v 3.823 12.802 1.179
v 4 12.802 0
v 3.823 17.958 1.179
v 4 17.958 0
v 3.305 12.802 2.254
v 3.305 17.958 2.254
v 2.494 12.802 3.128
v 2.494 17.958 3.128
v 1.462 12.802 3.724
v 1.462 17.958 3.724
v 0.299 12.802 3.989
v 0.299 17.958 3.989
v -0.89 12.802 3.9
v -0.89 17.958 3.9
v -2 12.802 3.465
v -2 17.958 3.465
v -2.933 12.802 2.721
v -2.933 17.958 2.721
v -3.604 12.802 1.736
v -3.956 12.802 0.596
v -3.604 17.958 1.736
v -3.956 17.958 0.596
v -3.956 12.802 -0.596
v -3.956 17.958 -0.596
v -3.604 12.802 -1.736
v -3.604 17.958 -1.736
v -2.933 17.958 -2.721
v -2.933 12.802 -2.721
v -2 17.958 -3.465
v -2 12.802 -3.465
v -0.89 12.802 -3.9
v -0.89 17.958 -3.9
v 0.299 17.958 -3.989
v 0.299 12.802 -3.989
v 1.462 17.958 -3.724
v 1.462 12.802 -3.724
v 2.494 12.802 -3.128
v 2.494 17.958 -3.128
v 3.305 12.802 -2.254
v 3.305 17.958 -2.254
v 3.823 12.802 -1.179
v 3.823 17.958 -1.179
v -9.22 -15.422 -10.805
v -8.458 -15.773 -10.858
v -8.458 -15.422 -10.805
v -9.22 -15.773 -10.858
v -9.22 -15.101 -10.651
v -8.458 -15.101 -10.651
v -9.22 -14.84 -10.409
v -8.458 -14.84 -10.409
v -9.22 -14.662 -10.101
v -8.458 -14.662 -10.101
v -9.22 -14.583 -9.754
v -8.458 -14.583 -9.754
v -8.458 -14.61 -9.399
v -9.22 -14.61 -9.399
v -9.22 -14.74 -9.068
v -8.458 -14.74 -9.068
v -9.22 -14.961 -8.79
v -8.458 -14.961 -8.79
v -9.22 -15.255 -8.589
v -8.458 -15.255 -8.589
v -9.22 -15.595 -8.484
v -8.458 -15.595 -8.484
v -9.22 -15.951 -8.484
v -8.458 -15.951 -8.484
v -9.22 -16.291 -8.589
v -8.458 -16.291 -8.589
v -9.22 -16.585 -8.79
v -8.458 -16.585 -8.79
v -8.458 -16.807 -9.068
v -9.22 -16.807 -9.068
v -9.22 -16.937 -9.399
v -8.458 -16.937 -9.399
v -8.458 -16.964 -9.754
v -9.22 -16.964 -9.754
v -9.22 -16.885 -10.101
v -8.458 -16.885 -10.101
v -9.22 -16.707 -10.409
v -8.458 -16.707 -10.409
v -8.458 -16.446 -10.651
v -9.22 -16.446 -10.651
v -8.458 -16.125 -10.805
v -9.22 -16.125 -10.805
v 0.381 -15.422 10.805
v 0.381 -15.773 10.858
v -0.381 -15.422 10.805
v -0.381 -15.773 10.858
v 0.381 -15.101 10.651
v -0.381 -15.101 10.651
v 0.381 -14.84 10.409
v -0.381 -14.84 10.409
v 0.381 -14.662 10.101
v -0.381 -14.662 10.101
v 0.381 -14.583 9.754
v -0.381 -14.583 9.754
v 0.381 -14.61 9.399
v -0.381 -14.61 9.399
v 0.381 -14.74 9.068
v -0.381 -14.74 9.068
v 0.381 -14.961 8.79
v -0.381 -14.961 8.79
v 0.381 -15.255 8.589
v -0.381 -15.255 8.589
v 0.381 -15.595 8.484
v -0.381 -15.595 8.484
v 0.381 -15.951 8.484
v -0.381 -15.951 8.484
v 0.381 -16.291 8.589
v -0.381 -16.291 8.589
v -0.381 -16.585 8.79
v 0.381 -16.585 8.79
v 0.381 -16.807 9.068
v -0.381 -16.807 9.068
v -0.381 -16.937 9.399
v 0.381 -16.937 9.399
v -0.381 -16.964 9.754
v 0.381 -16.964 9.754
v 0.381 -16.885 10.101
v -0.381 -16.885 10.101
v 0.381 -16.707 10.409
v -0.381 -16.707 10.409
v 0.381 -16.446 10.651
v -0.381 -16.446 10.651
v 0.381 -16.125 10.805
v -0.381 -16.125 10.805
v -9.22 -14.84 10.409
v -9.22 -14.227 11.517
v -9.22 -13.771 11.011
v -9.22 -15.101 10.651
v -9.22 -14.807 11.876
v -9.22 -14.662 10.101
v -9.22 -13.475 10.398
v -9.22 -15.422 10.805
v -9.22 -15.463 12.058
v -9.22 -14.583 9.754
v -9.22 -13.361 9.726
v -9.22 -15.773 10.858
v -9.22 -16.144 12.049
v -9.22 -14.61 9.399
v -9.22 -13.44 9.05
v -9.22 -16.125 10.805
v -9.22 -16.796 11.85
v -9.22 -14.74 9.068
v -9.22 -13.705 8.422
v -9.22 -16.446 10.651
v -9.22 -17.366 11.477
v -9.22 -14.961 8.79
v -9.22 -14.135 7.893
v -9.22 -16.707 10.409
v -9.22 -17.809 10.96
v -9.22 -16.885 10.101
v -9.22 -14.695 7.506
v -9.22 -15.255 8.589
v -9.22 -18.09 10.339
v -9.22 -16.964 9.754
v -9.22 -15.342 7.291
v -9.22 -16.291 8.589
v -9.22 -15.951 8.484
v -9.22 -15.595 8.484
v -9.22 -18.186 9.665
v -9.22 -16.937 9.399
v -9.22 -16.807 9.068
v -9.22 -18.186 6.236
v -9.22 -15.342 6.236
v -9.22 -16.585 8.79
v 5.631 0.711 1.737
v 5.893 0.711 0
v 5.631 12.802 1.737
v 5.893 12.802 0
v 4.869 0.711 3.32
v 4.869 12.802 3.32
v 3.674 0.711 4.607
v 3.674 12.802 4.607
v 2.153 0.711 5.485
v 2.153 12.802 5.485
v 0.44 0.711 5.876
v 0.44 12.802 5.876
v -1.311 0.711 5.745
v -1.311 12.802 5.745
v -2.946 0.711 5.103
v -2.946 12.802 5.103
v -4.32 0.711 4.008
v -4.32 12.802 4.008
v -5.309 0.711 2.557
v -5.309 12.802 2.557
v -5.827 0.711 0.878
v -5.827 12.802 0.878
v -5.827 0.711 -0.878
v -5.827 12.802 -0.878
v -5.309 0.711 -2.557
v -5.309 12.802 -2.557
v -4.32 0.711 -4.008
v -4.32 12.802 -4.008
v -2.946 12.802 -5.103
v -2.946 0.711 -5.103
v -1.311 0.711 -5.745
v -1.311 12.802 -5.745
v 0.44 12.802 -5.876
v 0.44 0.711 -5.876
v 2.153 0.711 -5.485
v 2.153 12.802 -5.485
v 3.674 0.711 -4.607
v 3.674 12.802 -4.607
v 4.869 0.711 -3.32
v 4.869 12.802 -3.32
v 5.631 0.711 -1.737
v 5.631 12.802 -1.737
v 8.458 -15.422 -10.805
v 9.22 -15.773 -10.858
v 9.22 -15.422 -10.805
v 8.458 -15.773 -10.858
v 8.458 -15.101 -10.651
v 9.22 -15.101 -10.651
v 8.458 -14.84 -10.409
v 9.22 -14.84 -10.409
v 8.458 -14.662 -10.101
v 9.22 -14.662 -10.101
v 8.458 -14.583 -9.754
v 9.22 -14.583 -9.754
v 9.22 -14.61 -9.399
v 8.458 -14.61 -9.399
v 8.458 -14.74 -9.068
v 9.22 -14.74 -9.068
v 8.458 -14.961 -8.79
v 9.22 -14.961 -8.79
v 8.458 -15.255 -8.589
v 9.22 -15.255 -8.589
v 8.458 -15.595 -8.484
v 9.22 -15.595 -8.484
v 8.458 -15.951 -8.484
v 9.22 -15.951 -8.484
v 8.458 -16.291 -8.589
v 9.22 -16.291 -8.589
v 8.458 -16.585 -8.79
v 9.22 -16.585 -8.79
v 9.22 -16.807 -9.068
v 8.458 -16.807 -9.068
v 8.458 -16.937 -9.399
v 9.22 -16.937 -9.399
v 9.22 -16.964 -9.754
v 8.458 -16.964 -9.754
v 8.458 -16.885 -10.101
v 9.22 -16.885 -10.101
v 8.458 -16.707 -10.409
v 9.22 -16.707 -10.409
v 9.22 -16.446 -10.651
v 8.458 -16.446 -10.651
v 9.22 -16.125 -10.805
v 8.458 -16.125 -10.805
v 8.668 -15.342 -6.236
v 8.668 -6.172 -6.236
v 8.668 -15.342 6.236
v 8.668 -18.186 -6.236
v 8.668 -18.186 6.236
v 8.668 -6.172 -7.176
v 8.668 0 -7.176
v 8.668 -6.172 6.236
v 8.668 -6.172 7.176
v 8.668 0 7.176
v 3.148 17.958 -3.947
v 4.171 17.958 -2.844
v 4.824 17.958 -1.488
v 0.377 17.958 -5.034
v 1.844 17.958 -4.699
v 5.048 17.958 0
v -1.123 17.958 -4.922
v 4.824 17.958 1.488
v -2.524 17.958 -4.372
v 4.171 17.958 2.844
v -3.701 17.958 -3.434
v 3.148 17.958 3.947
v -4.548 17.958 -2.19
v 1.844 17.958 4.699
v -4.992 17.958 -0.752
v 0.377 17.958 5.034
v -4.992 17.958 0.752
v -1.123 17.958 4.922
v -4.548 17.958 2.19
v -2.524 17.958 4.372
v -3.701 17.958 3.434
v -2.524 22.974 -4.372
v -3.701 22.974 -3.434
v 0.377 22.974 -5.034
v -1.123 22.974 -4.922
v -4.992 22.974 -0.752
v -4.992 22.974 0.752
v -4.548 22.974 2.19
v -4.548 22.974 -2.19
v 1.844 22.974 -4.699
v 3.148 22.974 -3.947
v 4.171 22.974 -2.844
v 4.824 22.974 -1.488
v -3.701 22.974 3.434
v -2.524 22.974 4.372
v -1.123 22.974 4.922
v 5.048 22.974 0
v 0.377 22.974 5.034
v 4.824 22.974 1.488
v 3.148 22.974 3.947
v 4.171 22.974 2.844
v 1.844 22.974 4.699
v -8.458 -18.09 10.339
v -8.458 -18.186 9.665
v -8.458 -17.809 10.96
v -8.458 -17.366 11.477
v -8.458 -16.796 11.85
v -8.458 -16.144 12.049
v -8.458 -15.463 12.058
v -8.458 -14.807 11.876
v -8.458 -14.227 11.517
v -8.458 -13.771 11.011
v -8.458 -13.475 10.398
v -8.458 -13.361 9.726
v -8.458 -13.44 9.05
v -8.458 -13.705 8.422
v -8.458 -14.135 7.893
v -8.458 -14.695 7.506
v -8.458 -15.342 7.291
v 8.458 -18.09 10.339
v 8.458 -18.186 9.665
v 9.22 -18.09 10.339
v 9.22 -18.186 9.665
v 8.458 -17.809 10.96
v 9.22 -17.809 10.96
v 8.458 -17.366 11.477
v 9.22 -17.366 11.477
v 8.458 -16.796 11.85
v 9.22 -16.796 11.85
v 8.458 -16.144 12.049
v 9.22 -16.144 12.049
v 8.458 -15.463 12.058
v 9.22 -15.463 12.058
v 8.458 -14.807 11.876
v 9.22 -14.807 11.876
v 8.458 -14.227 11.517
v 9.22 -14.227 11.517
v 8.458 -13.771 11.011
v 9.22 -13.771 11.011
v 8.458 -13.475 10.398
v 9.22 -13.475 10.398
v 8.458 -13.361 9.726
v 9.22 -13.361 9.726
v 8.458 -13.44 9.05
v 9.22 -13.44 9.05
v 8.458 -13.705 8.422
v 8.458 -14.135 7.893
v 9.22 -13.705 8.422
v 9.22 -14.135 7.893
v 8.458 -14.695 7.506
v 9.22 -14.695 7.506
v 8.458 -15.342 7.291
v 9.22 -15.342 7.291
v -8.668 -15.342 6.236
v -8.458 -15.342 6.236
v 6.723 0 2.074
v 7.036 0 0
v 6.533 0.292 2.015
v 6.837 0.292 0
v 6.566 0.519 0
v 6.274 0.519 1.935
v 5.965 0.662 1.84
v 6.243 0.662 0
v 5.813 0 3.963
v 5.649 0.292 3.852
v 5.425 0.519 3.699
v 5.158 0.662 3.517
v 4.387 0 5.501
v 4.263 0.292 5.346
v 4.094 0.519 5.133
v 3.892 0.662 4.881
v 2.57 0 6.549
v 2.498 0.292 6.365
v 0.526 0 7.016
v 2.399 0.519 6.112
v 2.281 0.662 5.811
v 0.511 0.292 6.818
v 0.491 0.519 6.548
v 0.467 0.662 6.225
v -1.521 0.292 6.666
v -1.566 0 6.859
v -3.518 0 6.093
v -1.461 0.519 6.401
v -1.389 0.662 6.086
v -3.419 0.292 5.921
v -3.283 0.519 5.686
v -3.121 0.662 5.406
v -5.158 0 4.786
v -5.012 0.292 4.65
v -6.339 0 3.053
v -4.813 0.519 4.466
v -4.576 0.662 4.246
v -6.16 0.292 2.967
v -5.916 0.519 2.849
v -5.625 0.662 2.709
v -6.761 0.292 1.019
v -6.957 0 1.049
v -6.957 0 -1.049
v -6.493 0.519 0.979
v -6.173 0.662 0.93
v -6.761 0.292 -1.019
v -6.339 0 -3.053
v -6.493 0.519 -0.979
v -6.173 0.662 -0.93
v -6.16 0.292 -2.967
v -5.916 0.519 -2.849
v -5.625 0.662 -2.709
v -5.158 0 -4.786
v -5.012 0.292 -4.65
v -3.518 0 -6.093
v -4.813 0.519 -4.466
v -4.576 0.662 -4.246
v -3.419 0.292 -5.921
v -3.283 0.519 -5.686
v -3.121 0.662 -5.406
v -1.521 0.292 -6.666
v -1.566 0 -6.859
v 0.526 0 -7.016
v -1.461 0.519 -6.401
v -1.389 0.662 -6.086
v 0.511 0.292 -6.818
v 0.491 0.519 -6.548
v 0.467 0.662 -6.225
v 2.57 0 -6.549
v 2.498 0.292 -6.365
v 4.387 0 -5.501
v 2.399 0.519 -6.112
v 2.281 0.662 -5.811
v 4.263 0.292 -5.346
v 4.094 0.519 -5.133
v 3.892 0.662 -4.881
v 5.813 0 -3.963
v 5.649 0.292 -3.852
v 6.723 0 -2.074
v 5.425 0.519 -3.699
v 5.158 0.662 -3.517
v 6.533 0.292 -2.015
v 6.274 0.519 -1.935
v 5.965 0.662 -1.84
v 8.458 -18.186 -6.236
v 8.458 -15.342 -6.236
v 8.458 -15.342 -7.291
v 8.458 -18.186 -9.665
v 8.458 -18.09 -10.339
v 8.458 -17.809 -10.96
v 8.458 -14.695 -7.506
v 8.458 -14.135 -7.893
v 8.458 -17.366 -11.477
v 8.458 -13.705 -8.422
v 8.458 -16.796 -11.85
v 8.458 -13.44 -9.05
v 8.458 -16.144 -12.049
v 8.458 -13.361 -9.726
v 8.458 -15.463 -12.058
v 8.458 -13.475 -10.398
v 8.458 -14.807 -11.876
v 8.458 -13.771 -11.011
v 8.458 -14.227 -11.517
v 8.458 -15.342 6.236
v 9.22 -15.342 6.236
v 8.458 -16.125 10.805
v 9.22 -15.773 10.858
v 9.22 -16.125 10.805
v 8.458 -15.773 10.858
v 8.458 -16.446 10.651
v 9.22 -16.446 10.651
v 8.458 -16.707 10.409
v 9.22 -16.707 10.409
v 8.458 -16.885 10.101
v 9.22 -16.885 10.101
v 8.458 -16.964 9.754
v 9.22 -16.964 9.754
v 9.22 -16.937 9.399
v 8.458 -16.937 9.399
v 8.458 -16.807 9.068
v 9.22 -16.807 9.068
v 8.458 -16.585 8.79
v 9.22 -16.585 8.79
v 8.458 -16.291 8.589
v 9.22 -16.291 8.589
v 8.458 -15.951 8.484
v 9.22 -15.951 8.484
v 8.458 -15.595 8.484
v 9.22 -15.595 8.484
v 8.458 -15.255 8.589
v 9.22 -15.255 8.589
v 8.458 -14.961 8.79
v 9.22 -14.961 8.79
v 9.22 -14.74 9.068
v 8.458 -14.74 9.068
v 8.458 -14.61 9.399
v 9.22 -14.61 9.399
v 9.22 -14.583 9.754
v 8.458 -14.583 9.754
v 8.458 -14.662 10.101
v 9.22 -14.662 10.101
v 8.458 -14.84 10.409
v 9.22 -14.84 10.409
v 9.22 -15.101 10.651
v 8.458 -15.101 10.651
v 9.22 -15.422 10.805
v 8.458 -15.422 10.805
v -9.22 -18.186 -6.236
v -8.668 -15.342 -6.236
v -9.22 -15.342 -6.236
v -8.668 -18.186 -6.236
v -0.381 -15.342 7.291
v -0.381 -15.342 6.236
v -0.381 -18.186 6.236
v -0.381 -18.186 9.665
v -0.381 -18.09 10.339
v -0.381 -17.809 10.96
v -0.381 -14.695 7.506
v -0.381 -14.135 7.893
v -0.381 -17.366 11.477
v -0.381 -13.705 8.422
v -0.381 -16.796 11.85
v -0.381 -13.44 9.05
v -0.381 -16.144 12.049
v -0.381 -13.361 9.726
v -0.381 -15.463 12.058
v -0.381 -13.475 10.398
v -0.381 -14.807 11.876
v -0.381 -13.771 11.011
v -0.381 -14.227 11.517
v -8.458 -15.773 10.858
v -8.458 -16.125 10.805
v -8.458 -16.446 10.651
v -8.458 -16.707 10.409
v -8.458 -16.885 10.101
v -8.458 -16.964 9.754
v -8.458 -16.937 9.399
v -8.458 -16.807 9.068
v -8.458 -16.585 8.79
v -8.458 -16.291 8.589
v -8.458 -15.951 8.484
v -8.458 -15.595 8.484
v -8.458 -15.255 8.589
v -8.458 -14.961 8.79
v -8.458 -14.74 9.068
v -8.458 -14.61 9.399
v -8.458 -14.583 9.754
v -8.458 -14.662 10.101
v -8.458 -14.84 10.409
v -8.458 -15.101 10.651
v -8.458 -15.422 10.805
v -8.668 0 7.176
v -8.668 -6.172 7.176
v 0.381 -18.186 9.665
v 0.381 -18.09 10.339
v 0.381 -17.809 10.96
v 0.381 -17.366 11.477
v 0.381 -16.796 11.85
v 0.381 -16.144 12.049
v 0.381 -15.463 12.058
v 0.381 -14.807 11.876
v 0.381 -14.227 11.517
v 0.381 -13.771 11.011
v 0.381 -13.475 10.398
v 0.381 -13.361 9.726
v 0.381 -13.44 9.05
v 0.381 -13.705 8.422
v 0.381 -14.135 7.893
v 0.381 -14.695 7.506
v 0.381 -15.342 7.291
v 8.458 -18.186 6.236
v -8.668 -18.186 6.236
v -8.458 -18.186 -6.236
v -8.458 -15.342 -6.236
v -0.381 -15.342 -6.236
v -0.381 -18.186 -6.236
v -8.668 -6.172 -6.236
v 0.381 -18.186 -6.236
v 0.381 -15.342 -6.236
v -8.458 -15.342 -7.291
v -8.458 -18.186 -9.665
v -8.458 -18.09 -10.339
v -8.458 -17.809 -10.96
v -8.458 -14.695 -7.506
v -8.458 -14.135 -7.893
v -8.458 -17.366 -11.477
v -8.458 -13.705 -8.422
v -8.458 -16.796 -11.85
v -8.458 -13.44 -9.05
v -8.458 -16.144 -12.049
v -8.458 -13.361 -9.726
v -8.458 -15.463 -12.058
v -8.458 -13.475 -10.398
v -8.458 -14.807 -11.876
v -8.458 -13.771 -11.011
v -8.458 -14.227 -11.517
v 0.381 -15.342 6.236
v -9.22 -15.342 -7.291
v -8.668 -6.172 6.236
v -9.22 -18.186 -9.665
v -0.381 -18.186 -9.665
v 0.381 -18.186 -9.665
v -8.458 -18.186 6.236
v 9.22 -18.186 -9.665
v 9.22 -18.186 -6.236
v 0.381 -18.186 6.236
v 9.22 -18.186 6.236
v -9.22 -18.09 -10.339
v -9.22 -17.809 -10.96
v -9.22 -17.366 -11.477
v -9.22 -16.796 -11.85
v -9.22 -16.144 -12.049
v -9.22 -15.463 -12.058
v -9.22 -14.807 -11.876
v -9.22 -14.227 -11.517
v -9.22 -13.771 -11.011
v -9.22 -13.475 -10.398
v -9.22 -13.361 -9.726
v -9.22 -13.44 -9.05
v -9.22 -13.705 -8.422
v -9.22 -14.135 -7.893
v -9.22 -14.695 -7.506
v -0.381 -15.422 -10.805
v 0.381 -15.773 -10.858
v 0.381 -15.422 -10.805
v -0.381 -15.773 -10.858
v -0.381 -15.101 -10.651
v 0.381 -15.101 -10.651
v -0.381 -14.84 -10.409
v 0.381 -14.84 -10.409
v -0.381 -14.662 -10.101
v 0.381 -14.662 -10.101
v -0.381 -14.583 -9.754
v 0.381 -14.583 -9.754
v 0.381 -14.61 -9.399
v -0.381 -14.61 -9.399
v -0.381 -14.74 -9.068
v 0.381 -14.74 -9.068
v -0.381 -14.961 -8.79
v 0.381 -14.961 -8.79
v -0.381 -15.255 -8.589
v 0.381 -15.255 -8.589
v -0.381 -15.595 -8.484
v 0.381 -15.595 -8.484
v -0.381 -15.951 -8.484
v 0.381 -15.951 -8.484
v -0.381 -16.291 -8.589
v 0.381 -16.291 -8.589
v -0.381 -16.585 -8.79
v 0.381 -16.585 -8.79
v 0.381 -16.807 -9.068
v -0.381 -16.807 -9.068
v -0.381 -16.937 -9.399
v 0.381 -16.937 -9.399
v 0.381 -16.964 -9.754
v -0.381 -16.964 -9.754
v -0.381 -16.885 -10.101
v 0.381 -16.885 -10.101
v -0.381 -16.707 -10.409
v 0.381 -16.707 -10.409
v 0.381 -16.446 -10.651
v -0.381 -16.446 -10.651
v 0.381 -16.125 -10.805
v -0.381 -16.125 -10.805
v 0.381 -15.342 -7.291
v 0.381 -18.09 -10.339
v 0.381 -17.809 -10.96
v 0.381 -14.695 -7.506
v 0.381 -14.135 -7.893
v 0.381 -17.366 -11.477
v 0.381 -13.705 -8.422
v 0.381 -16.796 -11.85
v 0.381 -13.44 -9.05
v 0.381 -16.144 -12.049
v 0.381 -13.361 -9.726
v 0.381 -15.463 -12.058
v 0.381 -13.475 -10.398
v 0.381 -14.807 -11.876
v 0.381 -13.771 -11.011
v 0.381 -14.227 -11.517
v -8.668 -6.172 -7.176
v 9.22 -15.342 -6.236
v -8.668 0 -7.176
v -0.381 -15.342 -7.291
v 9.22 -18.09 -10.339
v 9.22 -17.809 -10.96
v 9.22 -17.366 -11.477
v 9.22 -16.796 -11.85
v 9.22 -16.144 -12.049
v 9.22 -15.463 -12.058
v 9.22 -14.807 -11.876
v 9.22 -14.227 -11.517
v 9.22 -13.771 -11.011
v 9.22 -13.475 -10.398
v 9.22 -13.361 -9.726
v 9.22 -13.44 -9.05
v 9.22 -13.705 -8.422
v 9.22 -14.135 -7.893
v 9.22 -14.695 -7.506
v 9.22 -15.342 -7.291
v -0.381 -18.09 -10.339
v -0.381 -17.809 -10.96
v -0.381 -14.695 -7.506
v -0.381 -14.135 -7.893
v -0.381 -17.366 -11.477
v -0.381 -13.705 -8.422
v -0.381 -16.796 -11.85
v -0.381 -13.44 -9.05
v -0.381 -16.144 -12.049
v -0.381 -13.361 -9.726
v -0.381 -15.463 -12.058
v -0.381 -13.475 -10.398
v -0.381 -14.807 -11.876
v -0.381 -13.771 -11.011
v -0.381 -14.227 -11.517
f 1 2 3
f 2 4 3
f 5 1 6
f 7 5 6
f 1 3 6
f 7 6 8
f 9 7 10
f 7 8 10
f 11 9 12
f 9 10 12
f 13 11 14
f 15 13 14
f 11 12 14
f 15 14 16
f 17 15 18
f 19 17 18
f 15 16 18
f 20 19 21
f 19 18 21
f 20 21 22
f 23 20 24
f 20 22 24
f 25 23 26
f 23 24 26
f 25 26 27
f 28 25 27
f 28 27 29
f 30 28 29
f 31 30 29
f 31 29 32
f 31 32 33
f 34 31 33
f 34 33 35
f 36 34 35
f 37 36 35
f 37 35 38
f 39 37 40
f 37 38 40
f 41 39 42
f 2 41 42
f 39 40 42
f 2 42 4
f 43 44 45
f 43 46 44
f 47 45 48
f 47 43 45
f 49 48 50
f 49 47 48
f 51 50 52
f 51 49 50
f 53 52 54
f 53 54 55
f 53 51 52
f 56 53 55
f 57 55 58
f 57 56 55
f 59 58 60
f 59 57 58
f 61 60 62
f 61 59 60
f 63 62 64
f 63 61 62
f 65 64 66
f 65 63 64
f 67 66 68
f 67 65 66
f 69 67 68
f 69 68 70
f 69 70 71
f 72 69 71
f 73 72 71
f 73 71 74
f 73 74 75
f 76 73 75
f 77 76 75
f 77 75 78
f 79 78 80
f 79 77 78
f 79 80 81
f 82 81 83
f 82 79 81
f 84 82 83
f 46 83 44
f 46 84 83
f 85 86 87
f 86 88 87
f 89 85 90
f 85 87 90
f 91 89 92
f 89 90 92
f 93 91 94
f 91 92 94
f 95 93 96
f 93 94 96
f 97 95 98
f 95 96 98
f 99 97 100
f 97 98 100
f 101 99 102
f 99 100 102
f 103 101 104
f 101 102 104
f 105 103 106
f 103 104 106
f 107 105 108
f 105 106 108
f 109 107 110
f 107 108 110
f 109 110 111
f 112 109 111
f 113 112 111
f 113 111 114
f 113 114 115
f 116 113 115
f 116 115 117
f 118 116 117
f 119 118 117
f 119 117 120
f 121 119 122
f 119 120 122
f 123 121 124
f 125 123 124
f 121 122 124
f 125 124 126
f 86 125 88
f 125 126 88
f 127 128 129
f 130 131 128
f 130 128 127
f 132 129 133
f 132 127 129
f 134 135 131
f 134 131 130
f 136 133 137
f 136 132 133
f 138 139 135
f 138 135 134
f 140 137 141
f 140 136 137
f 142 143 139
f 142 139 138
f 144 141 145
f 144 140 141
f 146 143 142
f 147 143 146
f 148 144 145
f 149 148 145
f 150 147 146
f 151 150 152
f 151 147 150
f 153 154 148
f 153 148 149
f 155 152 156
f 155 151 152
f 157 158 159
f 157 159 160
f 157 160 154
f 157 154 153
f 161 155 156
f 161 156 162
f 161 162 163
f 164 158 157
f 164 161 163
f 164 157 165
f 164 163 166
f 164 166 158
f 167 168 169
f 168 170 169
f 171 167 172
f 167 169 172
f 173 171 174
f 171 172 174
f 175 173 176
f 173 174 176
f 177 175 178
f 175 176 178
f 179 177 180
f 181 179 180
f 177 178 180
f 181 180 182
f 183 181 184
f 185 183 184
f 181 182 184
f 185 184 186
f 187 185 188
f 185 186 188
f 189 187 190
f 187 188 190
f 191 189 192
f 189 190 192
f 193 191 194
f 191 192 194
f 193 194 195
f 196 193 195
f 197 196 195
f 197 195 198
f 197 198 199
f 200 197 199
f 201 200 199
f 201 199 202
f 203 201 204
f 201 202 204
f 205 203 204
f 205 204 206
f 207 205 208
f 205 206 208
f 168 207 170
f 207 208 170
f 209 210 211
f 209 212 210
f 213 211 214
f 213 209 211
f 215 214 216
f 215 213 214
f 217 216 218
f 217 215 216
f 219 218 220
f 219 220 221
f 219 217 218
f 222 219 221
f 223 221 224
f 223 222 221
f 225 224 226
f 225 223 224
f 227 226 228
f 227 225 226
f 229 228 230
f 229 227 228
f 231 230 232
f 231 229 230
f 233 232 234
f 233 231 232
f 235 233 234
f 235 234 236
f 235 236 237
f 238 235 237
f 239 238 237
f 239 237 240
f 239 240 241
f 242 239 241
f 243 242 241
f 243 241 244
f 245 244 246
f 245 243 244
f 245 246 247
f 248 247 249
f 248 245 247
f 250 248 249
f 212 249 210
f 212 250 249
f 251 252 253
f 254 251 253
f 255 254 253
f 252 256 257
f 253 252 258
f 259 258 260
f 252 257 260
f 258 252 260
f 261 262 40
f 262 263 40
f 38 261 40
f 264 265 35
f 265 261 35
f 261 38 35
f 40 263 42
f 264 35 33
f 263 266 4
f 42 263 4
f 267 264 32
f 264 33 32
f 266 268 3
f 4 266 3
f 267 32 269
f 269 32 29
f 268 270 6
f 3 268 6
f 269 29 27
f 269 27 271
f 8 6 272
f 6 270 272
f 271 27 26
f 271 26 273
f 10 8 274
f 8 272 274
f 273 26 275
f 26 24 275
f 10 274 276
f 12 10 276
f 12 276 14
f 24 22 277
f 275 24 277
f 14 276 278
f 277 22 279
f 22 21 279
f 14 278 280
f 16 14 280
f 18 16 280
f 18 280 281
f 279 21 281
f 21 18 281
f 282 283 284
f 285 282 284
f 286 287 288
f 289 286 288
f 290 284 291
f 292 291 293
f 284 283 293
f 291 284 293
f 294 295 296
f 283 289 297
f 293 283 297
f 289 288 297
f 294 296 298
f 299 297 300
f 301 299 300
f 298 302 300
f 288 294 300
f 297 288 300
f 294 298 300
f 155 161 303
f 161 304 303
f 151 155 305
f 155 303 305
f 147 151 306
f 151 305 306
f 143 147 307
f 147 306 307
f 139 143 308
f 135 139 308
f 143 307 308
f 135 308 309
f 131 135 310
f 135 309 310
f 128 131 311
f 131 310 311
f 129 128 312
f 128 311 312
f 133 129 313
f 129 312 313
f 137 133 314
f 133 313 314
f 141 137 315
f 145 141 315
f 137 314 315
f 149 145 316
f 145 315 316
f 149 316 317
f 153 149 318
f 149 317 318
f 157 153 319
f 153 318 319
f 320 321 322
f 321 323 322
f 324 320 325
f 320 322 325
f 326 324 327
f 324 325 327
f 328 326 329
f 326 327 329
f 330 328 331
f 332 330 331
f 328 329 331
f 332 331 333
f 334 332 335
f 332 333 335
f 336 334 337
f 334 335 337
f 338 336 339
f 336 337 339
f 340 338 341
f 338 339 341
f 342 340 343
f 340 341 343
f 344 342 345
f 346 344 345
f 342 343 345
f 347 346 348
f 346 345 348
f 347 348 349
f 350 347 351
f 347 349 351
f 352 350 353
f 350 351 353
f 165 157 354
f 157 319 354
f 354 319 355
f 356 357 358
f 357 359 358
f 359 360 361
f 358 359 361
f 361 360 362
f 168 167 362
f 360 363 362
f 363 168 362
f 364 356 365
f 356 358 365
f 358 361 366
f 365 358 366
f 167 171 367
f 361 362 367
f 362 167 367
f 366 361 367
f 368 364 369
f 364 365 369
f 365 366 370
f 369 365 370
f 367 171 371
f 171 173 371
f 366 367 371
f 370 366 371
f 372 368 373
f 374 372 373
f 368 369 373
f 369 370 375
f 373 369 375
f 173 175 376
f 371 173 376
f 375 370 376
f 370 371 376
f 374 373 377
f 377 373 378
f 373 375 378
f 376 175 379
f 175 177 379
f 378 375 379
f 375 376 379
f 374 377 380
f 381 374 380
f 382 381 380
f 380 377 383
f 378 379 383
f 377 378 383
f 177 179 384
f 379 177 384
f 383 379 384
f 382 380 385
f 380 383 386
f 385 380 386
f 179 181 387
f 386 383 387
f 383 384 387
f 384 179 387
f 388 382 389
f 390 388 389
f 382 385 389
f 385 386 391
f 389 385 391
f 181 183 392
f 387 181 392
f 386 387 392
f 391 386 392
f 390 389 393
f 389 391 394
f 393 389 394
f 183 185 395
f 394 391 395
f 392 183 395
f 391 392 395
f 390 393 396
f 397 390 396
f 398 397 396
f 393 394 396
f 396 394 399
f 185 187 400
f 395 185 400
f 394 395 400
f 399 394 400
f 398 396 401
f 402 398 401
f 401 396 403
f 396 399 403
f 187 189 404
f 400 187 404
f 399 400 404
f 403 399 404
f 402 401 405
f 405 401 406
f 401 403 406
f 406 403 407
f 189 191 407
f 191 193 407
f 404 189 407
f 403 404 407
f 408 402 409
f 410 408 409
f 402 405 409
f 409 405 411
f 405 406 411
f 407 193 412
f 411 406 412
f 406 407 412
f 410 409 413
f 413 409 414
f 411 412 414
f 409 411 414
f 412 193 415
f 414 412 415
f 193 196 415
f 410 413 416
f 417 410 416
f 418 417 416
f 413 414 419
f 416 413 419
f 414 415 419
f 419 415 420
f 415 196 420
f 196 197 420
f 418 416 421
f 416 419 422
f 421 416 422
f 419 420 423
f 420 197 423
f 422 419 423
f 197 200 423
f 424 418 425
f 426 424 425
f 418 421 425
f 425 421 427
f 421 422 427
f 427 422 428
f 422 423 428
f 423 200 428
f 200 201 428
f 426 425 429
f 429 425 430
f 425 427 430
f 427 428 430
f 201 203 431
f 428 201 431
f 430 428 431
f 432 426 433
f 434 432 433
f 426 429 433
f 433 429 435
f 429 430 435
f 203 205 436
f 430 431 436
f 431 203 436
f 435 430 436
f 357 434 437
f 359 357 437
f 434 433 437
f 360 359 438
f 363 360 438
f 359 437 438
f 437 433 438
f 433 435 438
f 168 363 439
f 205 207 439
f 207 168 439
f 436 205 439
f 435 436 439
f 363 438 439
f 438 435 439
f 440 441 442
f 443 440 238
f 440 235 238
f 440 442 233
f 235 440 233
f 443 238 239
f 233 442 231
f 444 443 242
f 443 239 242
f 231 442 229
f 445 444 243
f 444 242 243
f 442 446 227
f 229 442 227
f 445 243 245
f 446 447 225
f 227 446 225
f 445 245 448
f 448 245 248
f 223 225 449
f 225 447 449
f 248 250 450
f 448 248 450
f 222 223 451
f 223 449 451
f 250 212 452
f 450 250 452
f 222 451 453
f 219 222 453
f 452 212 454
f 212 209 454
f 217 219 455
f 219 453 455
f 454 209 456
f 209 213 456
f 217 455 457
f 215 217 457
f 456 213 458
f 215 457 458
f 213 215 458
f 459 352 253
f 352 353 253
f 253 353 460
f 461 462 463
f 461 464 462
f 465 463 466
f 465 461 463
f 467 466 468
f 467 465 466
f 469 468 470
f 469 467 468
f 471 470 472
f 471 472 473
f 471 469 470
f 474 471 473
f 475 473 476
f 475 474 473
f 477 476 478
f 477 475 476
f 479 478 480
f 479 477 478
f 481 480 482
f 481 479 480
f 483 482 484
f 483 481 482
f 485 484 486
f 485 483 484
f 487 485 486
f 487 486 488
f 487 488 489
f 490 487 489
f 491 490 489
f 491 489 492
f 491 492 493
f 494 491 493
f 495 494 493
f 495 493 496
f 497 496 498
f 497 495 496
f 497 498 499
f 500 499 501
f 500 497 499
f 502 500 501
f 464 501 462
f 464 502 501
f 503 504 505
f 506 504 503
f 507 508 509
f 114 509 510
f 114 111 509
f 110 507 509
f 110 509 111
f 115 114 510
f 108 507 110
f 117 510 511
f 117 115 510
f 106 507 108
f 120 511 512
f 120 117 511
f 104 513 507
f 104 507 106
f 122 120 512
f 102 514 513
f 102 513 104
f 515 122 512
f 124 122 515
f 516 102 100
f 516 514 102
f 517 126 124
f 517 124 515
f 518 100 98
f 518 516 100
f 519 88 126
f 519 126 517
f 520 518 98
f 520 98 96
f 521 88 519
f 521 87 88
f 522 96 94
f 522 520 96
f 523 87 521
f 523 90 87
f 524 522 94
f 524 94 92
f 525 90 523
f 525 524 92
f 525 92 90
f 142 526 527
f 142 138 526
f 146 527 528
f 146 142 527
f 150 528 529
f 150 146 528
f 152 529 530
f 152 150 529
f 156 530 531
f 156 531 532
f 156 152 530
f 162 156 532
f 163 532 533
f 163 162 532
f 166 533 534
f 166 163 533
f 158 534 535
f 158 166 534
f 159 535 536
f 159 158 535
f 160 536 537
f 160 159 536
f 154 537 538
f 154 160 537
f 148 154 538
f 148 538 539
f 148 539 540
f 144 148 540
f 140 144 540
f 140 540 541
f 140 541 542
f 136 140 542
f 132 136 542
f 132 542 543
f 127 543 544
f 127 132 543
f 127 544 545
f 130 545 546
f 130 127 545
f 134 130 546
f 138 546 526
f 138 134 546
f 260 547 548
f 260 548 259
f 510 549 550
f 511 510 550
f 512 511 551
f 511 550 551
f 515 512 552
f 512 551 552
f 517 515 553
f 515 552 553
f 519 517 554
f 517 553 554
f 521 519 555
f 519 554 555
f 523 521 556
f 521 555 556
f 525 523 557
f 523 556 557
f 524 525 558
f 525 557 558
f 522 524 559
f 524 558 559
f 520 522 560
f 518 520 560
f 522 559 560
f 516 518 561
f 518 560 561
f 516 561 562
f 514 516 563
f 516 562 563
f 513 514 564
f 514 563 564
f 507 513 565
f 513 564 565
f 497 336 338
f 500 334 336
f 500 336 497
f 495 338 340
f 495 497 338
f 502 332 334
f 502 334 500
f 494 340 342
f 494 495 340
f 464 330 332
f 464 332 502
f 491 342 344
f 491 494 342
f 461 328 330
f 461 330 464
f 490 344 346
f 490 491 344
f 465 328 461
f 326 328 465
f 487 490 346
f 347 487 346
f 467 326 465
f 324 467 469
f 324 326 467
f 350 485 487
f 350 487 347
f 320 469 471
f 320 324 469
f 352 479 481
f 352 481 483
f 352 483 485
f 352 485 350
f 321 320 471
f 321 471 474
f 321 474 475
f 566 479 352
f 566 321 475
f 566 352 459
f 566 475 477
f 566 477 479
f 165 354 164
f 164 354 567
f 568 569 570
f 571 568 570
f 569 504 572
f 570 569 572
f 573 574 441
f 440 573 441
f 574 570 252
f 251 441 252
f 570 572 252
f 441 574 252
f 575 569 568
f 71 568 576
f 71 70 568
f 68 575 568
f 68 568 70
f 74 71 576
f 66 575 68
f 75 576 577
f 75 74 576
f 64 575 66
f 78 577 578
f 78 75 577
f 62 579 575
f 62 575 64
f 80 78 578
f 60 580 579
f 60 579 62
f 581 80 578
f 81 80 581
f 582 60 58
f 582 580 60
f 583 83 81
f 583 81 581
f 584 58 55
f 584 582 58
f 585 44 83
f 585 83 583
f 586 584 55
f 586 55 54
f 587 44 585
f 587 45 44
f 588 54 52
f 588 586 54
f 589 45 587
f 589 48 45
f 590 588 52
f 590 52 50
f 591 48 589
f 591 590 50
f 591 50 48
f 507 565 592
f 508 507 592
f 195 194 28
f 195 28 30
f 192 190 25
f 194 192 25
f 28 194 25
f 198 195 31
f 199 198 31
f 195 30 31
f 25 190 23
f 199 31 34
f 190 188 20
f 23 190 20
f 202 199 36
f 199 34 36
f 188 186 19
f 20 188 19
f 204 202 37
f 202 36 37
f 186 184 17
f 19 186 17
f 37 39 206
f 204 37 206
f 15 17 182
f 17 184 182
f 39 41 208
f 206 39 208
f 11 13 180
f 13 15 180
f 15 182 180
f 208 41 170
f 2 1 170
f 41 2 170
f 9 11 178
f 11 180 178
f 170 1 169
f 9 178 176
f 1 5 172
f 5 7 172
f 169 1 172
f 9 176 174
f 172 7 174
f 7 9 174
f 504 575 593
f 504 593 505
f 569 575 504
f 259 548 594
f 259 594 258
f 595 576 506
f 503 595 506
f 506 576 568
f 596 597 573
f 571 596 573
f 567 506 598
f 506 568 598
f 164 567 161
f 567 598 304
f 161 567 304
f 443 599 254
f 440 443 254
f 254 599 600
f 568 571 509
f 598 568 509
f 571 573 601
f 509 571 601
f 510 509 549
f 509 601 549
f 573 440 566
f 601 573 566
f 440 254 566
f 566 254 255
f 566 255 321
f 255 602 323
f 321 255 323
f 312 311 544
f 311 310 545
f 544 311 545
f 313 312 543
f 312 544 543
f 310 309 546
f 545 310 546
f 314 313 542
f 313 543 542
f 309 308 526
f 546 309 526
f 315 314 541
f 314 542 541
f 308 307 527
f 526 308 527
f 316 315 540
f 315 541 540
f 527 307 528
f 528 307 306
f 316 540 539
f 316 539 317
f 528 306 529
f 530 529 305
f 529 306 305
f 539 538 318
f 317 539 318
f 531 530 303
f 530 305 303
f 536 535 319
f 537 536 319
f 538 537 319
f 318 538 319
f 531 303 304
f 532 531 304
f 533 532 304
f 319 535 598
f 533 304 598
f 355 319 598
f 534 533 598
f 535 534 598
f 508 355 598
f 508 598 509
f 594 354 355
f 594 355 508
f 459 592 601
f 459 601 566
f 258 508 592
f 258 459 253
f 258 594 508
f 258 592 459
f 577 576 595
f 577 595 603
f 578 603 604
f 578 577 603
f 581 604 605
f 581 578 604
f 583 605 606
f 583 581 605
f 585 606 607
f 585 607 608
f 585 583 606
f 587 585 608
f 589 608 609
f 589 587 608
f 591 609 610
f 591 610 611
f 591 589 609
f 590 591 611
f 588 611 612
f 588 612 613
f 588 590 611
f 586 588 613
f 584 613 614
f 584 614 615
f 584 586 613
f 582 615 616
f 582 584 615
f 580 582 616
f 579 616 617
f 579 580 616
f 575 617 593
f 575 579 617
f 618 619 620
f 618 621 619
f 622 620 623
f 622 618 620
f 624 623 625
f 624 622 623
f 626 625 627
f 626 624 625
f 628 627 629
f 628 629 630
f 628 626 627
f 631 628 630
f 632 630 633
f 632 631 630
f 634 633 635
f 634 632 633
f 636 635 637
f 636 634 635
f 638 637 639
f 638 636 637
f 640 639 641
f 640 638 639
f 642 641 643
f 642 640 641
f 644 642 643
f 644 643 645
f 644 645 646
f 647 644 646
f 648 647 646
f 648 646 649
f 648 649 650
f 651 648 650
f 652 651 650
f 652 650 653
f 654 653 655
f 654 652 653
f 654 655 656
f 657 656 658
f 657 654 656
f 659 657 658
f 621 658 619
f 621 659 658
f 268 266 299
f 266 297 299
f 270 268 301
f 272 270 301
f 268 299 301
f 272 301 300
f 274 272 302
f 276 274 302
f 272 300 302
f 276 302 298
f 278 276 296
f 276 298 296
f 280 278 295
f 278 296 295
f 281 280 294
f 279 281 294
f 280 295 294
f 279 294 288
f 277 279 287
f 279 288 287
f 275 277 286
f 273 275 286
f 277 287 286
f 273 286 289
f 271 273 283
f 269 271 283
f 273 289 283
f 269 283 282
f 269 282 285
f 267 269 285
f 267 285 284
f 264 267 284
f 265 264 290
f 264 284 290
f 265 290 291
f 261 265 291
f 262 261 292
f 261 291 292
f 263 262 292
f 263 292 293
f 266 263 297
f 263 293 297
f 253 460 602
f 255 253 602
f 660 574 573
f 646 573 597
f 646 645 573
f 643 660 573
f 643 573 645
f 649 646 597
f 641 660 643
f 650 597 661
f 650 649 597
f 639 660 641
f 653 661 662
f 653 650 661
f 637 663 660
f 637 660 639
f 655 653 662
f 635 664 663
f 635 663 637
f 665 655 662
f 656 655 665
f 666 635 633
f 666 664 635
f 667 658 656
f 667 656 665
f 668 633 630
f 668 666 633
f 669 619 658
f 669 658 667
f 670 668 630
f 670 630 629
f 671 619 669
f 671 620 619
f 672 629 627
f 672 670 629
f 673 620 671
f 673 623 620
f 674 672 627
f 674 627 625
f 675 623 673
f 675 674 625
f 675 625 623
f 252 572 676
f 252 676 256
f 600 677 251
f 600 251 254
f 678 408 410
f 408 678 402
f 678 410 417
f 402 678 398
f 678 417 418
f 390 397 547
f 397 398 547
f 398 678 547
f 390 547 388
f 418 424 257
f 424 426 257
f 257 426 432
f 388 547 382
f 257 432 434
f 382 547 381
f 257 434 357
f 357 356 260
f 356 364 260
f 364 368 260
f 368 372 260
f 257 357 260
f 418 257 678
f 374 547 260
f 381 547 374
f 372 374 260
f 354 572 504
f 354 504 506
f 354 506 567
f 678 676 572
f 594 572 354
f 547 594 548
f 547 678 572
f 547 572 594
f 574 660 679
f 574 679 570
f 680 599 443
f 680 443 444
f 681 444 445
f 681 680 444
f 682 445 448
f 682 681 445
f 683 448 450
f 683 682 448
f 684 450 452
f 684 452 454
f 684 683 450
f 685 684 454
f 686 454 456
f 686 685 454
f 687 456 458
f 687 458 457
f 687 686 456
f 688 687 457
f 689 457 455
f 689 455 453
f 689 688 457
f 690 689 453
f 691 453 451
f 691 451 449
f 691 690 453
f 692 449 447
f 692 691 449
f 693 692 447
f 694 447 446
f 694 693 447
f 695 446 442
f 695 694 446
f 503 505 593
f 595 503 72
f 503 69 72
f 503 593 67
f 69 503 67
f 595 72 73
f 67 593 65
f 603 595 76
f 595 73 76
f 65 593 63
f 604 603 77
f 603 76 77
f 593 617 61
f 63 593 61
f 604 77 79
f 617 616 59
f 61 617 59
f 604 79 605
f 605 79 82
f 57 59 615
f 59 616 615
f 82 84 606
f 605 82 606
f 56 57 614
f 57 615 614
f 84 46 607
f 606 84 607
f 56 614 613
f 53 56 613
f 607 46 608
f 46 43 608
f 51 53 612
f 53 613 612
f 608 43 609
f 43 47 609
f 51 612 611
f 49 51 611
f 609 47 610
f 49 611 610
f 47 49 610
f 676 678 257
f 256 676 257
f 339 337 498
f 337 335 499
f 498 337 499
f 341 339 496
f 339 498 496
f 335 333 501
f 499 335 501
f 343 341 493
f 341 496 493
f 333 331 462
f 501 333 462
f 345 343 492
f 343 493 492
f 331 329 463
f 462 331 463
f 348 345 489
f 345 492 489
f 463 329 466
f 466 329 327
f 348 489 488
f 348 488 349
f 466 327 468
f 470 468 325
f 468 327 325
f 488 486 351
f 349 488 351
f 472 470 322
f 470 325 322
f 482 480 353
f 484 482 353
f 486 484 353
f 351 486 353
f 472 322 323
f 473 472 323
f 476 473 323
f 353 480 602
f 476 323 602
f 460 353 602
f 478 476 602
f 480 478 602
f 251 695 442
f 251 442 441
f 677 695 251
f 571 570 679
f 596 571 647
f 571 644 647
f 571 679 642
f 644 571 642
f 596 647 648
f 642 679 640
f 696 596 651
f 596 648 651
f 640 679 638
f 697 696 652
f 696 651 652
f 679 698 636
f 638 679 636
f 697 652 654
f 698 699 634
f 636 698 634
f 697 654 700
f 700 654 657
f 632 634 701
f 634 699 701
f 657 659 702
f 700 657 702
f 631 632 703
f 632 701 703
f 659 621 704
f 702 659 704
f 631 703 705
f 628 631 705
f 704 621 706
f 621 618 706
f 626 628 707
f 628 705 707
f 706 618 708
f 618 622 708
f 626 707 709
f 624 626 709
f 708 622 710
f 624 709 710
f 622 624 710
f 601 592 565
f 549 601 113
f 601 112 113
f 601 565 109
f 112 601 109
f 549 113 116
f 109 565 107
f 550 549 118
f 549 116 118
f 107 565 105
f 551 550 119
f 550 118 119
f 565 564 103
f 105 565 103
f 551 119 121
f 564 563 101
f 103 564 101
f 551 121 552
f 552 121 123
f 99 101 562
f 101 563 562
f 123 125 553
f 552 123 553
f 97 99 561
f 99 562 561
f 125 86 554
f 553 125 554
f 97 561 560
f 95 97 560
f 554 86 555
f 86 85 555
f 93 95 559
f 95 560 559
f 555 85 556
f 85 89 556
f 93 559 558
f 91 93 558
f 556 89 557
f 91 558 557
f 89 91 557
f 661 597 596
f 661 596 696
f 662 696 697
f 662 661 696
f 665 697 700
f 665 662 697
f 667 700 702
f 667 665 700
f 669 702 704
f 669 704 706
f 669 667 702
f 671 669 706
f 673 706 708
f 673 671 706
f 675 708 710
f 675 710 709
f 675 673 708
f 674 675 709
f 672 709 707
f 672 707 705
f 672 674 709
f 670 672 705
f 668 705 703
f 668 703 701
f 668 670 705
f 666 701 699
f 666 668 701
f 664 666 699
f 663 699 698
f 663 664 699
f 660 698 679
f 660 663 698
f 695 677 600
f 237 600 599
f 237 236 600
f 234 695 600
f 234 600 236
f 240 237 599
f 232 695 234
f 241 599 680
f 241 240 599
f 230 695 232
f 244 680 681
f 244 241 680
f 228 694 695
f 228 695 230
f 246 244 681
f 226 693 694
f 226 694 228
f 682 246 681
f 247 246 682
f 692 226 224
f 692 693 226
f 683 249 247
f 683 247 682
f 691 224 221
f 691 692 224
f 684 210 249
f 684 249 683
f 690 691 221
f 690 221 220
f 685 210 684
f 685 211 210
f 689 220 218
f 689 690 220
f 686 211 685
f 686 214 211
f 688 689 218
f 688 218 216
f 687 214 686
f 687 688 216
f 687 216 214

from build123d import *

# Parameters (mm, degrees)
SKETCH2_W               = 17.3355
SKETCH2_H               = 14.351
BOSS_EXTRUDE1_DEPTH     = 6.1722
SKETCH3_W               = 17.3355
SKETCH3_H               = 12.4714
BOSS_EXTRUDE2_DEPTH     = 12.0142
SKETCH4_R               = 1.1938
BOSS_EXTRUDE3_DEPTH     = 0.381
LPATTERN1_COUNT         = 2
LPATTERN1_PITCH         = 8.8392
LPATTERN1_COL_COUNT     = 2
LPATTERN1_COL_PITCH     = 8.8392
MIRROR1_COPY_1_SKETCH_R = 1.1938
MIRROR1_COPY_1_DEPTH    = 0.381
MIRROR1_COPY_2_SKETCH_R = 1.1938
MIRROR1_COPY_2_DEPTH    = 0.381


with BuildPart() as part:
    # Sketch1 → Revolve1 (revolve)
    with BuildSketch(Plane.XY):
        with BuildLine():
            Line((0, 0), (7.0358, 0))
            ThreePointArc((7.0358, 0), (6.5659, 0.518885714), (5.8928, 0.7112))
            Line((5.8928, 0.7112), (5.8928, 12.8016))
            Line((5.8928, 12.8016), (4.0005, 12.8016))
            Line((4.0005, 12.8016), (4.0005, 17.9578))
            Line((4.0005, 17.9578), (5.04825, 17.9578))
            Line((5.04825, 17.9578), (5.04825, 22.9743))
            Line((5.04825, 22.9743), (0, 22.9743))
            Line((0, 22.9743), (0, 0))
        make_face()
    revolve(axis=Axis((0, 17.332868294, 0), (0, -1, 0)))

    # Sketch2 → Boss-Extrude1 (add)
    with BuildSketch(Plane.XZ):
        Rectangle(SKETCH2_W, SKETCH2_H)
    extrude(amount=BOSS_EXTRUDE1_DEPTH)

    # Sketch3 → Boss-Extrude2 (add)
    with BuildSketch(Plane.XZ.offset(6.1722)):
        Rectangle(SKETCH3_W, SKETCH3_H)
    extrude(amount=BOSS_EXTRUDE2_DEPTH)

    # Sketch4 → Boss-Extrude3 (add, symmetric)
    with BuildSketch(Plane(origin=(0, 0, 0), x_dir=(0, 0, -1), z_dir=(1, 0, 0))):
        with BuildLine():
            Line((6.2357, -18.1864), (9.6647, -18.1864))
            ThreePointArc((9.6647, -18.1864), (11.517333585, -14.227334736), (7.290649082, -15.3416))
            Line((7.290649082, -15.3416), (6.2357, -15.3416))
            Line((6.2357, -15.3416), (6.2357, -18.1864))
        make_face()
        with Locations((9.6647, -15.7734)):
            Circle(SKETCH4_R, mode=Mode.SUBTRACT)
    boss_extrude3 = extrude(amount=BOSS_EXTRUDE3_DEPTH, both=True)

    # LPattern1: Boss-Extrude3 ×2
    with Locations(*[(i * LPATTERN1_PITCH, 0, 0) for i in range(1, LPATTERN1_COUNT)]):
        add(boss_extrude3)

    # LPattern1 col: Boss-Extrude3 ×2
    with Locations(*[(-i * LPATTERN1_COL_PITCH, 0, 0) for i in range(1, LPATTERN1_COL_COUNT)]):
        add(boss_extrude3)

    # Mirror1: Boss-Extrude3 across plane
    add(boss_extrude3.mirror(Plane.XY))

    # Mirror1 copy 1 sketch → Mirror1 copy 1 (add, symmetric)
    with BuildSketch(Plane(origin=(8.8392, 0, 0), x_dir=(0, 0, 1), z_dir=(1, 0, 0))):
        with BuildLine():
            Line((6.2357, 18.1864), (9.6647, 18.1864))
            ThreePointArc((9.6647, 18.1864), (11.517333585, 14.227334736), (7.290649082, 15.3416))
            Line((7.290649082, 15.3416), (6.2357, 15.3416))
            Line((6.2357, 15.3416), (6.2357, 18.1864))
        make_face()
        with Locations((9.6647, 15.7734)):
            Circle(MIRROR1_COPY_1_SKETCH_R, mode=Mode.SUBTRACT)
    extrude(amount=MIRROR1_COPY_1_DEPTH, both=True)

    # Mirror1 copy 2 sketch → Mirror1 copy 2 (add, symmetric)
    with BuildSketch(Plane(origin=(-8.8392, 0, 0), x_dir=(0, 0, 1), z_dir=(1, 0, 0))):
        with BuildLine():
            Line((6.2357, 18.1864), (9.6647, 18.1864))
            ThreePointArc((9.6647, 18.1864), (11.517333585, 14.227334736), (7.290649082, 15.3416))
            Line((7.290649082, 15.3416), (6.2357, 15.3416))
            Line((6.2357, 15.3416), (6.2357, 18.1864))
        make_face()
        with Locations((9.6647, 15.7734)):
            Circle(MIRROR1_COPY_2_SKETCH_R, mode=Mode.SUBTRACT)
    extrude(amount=MIRROR1_COPY_2_DEPTH, both=True)


solid = part.part
